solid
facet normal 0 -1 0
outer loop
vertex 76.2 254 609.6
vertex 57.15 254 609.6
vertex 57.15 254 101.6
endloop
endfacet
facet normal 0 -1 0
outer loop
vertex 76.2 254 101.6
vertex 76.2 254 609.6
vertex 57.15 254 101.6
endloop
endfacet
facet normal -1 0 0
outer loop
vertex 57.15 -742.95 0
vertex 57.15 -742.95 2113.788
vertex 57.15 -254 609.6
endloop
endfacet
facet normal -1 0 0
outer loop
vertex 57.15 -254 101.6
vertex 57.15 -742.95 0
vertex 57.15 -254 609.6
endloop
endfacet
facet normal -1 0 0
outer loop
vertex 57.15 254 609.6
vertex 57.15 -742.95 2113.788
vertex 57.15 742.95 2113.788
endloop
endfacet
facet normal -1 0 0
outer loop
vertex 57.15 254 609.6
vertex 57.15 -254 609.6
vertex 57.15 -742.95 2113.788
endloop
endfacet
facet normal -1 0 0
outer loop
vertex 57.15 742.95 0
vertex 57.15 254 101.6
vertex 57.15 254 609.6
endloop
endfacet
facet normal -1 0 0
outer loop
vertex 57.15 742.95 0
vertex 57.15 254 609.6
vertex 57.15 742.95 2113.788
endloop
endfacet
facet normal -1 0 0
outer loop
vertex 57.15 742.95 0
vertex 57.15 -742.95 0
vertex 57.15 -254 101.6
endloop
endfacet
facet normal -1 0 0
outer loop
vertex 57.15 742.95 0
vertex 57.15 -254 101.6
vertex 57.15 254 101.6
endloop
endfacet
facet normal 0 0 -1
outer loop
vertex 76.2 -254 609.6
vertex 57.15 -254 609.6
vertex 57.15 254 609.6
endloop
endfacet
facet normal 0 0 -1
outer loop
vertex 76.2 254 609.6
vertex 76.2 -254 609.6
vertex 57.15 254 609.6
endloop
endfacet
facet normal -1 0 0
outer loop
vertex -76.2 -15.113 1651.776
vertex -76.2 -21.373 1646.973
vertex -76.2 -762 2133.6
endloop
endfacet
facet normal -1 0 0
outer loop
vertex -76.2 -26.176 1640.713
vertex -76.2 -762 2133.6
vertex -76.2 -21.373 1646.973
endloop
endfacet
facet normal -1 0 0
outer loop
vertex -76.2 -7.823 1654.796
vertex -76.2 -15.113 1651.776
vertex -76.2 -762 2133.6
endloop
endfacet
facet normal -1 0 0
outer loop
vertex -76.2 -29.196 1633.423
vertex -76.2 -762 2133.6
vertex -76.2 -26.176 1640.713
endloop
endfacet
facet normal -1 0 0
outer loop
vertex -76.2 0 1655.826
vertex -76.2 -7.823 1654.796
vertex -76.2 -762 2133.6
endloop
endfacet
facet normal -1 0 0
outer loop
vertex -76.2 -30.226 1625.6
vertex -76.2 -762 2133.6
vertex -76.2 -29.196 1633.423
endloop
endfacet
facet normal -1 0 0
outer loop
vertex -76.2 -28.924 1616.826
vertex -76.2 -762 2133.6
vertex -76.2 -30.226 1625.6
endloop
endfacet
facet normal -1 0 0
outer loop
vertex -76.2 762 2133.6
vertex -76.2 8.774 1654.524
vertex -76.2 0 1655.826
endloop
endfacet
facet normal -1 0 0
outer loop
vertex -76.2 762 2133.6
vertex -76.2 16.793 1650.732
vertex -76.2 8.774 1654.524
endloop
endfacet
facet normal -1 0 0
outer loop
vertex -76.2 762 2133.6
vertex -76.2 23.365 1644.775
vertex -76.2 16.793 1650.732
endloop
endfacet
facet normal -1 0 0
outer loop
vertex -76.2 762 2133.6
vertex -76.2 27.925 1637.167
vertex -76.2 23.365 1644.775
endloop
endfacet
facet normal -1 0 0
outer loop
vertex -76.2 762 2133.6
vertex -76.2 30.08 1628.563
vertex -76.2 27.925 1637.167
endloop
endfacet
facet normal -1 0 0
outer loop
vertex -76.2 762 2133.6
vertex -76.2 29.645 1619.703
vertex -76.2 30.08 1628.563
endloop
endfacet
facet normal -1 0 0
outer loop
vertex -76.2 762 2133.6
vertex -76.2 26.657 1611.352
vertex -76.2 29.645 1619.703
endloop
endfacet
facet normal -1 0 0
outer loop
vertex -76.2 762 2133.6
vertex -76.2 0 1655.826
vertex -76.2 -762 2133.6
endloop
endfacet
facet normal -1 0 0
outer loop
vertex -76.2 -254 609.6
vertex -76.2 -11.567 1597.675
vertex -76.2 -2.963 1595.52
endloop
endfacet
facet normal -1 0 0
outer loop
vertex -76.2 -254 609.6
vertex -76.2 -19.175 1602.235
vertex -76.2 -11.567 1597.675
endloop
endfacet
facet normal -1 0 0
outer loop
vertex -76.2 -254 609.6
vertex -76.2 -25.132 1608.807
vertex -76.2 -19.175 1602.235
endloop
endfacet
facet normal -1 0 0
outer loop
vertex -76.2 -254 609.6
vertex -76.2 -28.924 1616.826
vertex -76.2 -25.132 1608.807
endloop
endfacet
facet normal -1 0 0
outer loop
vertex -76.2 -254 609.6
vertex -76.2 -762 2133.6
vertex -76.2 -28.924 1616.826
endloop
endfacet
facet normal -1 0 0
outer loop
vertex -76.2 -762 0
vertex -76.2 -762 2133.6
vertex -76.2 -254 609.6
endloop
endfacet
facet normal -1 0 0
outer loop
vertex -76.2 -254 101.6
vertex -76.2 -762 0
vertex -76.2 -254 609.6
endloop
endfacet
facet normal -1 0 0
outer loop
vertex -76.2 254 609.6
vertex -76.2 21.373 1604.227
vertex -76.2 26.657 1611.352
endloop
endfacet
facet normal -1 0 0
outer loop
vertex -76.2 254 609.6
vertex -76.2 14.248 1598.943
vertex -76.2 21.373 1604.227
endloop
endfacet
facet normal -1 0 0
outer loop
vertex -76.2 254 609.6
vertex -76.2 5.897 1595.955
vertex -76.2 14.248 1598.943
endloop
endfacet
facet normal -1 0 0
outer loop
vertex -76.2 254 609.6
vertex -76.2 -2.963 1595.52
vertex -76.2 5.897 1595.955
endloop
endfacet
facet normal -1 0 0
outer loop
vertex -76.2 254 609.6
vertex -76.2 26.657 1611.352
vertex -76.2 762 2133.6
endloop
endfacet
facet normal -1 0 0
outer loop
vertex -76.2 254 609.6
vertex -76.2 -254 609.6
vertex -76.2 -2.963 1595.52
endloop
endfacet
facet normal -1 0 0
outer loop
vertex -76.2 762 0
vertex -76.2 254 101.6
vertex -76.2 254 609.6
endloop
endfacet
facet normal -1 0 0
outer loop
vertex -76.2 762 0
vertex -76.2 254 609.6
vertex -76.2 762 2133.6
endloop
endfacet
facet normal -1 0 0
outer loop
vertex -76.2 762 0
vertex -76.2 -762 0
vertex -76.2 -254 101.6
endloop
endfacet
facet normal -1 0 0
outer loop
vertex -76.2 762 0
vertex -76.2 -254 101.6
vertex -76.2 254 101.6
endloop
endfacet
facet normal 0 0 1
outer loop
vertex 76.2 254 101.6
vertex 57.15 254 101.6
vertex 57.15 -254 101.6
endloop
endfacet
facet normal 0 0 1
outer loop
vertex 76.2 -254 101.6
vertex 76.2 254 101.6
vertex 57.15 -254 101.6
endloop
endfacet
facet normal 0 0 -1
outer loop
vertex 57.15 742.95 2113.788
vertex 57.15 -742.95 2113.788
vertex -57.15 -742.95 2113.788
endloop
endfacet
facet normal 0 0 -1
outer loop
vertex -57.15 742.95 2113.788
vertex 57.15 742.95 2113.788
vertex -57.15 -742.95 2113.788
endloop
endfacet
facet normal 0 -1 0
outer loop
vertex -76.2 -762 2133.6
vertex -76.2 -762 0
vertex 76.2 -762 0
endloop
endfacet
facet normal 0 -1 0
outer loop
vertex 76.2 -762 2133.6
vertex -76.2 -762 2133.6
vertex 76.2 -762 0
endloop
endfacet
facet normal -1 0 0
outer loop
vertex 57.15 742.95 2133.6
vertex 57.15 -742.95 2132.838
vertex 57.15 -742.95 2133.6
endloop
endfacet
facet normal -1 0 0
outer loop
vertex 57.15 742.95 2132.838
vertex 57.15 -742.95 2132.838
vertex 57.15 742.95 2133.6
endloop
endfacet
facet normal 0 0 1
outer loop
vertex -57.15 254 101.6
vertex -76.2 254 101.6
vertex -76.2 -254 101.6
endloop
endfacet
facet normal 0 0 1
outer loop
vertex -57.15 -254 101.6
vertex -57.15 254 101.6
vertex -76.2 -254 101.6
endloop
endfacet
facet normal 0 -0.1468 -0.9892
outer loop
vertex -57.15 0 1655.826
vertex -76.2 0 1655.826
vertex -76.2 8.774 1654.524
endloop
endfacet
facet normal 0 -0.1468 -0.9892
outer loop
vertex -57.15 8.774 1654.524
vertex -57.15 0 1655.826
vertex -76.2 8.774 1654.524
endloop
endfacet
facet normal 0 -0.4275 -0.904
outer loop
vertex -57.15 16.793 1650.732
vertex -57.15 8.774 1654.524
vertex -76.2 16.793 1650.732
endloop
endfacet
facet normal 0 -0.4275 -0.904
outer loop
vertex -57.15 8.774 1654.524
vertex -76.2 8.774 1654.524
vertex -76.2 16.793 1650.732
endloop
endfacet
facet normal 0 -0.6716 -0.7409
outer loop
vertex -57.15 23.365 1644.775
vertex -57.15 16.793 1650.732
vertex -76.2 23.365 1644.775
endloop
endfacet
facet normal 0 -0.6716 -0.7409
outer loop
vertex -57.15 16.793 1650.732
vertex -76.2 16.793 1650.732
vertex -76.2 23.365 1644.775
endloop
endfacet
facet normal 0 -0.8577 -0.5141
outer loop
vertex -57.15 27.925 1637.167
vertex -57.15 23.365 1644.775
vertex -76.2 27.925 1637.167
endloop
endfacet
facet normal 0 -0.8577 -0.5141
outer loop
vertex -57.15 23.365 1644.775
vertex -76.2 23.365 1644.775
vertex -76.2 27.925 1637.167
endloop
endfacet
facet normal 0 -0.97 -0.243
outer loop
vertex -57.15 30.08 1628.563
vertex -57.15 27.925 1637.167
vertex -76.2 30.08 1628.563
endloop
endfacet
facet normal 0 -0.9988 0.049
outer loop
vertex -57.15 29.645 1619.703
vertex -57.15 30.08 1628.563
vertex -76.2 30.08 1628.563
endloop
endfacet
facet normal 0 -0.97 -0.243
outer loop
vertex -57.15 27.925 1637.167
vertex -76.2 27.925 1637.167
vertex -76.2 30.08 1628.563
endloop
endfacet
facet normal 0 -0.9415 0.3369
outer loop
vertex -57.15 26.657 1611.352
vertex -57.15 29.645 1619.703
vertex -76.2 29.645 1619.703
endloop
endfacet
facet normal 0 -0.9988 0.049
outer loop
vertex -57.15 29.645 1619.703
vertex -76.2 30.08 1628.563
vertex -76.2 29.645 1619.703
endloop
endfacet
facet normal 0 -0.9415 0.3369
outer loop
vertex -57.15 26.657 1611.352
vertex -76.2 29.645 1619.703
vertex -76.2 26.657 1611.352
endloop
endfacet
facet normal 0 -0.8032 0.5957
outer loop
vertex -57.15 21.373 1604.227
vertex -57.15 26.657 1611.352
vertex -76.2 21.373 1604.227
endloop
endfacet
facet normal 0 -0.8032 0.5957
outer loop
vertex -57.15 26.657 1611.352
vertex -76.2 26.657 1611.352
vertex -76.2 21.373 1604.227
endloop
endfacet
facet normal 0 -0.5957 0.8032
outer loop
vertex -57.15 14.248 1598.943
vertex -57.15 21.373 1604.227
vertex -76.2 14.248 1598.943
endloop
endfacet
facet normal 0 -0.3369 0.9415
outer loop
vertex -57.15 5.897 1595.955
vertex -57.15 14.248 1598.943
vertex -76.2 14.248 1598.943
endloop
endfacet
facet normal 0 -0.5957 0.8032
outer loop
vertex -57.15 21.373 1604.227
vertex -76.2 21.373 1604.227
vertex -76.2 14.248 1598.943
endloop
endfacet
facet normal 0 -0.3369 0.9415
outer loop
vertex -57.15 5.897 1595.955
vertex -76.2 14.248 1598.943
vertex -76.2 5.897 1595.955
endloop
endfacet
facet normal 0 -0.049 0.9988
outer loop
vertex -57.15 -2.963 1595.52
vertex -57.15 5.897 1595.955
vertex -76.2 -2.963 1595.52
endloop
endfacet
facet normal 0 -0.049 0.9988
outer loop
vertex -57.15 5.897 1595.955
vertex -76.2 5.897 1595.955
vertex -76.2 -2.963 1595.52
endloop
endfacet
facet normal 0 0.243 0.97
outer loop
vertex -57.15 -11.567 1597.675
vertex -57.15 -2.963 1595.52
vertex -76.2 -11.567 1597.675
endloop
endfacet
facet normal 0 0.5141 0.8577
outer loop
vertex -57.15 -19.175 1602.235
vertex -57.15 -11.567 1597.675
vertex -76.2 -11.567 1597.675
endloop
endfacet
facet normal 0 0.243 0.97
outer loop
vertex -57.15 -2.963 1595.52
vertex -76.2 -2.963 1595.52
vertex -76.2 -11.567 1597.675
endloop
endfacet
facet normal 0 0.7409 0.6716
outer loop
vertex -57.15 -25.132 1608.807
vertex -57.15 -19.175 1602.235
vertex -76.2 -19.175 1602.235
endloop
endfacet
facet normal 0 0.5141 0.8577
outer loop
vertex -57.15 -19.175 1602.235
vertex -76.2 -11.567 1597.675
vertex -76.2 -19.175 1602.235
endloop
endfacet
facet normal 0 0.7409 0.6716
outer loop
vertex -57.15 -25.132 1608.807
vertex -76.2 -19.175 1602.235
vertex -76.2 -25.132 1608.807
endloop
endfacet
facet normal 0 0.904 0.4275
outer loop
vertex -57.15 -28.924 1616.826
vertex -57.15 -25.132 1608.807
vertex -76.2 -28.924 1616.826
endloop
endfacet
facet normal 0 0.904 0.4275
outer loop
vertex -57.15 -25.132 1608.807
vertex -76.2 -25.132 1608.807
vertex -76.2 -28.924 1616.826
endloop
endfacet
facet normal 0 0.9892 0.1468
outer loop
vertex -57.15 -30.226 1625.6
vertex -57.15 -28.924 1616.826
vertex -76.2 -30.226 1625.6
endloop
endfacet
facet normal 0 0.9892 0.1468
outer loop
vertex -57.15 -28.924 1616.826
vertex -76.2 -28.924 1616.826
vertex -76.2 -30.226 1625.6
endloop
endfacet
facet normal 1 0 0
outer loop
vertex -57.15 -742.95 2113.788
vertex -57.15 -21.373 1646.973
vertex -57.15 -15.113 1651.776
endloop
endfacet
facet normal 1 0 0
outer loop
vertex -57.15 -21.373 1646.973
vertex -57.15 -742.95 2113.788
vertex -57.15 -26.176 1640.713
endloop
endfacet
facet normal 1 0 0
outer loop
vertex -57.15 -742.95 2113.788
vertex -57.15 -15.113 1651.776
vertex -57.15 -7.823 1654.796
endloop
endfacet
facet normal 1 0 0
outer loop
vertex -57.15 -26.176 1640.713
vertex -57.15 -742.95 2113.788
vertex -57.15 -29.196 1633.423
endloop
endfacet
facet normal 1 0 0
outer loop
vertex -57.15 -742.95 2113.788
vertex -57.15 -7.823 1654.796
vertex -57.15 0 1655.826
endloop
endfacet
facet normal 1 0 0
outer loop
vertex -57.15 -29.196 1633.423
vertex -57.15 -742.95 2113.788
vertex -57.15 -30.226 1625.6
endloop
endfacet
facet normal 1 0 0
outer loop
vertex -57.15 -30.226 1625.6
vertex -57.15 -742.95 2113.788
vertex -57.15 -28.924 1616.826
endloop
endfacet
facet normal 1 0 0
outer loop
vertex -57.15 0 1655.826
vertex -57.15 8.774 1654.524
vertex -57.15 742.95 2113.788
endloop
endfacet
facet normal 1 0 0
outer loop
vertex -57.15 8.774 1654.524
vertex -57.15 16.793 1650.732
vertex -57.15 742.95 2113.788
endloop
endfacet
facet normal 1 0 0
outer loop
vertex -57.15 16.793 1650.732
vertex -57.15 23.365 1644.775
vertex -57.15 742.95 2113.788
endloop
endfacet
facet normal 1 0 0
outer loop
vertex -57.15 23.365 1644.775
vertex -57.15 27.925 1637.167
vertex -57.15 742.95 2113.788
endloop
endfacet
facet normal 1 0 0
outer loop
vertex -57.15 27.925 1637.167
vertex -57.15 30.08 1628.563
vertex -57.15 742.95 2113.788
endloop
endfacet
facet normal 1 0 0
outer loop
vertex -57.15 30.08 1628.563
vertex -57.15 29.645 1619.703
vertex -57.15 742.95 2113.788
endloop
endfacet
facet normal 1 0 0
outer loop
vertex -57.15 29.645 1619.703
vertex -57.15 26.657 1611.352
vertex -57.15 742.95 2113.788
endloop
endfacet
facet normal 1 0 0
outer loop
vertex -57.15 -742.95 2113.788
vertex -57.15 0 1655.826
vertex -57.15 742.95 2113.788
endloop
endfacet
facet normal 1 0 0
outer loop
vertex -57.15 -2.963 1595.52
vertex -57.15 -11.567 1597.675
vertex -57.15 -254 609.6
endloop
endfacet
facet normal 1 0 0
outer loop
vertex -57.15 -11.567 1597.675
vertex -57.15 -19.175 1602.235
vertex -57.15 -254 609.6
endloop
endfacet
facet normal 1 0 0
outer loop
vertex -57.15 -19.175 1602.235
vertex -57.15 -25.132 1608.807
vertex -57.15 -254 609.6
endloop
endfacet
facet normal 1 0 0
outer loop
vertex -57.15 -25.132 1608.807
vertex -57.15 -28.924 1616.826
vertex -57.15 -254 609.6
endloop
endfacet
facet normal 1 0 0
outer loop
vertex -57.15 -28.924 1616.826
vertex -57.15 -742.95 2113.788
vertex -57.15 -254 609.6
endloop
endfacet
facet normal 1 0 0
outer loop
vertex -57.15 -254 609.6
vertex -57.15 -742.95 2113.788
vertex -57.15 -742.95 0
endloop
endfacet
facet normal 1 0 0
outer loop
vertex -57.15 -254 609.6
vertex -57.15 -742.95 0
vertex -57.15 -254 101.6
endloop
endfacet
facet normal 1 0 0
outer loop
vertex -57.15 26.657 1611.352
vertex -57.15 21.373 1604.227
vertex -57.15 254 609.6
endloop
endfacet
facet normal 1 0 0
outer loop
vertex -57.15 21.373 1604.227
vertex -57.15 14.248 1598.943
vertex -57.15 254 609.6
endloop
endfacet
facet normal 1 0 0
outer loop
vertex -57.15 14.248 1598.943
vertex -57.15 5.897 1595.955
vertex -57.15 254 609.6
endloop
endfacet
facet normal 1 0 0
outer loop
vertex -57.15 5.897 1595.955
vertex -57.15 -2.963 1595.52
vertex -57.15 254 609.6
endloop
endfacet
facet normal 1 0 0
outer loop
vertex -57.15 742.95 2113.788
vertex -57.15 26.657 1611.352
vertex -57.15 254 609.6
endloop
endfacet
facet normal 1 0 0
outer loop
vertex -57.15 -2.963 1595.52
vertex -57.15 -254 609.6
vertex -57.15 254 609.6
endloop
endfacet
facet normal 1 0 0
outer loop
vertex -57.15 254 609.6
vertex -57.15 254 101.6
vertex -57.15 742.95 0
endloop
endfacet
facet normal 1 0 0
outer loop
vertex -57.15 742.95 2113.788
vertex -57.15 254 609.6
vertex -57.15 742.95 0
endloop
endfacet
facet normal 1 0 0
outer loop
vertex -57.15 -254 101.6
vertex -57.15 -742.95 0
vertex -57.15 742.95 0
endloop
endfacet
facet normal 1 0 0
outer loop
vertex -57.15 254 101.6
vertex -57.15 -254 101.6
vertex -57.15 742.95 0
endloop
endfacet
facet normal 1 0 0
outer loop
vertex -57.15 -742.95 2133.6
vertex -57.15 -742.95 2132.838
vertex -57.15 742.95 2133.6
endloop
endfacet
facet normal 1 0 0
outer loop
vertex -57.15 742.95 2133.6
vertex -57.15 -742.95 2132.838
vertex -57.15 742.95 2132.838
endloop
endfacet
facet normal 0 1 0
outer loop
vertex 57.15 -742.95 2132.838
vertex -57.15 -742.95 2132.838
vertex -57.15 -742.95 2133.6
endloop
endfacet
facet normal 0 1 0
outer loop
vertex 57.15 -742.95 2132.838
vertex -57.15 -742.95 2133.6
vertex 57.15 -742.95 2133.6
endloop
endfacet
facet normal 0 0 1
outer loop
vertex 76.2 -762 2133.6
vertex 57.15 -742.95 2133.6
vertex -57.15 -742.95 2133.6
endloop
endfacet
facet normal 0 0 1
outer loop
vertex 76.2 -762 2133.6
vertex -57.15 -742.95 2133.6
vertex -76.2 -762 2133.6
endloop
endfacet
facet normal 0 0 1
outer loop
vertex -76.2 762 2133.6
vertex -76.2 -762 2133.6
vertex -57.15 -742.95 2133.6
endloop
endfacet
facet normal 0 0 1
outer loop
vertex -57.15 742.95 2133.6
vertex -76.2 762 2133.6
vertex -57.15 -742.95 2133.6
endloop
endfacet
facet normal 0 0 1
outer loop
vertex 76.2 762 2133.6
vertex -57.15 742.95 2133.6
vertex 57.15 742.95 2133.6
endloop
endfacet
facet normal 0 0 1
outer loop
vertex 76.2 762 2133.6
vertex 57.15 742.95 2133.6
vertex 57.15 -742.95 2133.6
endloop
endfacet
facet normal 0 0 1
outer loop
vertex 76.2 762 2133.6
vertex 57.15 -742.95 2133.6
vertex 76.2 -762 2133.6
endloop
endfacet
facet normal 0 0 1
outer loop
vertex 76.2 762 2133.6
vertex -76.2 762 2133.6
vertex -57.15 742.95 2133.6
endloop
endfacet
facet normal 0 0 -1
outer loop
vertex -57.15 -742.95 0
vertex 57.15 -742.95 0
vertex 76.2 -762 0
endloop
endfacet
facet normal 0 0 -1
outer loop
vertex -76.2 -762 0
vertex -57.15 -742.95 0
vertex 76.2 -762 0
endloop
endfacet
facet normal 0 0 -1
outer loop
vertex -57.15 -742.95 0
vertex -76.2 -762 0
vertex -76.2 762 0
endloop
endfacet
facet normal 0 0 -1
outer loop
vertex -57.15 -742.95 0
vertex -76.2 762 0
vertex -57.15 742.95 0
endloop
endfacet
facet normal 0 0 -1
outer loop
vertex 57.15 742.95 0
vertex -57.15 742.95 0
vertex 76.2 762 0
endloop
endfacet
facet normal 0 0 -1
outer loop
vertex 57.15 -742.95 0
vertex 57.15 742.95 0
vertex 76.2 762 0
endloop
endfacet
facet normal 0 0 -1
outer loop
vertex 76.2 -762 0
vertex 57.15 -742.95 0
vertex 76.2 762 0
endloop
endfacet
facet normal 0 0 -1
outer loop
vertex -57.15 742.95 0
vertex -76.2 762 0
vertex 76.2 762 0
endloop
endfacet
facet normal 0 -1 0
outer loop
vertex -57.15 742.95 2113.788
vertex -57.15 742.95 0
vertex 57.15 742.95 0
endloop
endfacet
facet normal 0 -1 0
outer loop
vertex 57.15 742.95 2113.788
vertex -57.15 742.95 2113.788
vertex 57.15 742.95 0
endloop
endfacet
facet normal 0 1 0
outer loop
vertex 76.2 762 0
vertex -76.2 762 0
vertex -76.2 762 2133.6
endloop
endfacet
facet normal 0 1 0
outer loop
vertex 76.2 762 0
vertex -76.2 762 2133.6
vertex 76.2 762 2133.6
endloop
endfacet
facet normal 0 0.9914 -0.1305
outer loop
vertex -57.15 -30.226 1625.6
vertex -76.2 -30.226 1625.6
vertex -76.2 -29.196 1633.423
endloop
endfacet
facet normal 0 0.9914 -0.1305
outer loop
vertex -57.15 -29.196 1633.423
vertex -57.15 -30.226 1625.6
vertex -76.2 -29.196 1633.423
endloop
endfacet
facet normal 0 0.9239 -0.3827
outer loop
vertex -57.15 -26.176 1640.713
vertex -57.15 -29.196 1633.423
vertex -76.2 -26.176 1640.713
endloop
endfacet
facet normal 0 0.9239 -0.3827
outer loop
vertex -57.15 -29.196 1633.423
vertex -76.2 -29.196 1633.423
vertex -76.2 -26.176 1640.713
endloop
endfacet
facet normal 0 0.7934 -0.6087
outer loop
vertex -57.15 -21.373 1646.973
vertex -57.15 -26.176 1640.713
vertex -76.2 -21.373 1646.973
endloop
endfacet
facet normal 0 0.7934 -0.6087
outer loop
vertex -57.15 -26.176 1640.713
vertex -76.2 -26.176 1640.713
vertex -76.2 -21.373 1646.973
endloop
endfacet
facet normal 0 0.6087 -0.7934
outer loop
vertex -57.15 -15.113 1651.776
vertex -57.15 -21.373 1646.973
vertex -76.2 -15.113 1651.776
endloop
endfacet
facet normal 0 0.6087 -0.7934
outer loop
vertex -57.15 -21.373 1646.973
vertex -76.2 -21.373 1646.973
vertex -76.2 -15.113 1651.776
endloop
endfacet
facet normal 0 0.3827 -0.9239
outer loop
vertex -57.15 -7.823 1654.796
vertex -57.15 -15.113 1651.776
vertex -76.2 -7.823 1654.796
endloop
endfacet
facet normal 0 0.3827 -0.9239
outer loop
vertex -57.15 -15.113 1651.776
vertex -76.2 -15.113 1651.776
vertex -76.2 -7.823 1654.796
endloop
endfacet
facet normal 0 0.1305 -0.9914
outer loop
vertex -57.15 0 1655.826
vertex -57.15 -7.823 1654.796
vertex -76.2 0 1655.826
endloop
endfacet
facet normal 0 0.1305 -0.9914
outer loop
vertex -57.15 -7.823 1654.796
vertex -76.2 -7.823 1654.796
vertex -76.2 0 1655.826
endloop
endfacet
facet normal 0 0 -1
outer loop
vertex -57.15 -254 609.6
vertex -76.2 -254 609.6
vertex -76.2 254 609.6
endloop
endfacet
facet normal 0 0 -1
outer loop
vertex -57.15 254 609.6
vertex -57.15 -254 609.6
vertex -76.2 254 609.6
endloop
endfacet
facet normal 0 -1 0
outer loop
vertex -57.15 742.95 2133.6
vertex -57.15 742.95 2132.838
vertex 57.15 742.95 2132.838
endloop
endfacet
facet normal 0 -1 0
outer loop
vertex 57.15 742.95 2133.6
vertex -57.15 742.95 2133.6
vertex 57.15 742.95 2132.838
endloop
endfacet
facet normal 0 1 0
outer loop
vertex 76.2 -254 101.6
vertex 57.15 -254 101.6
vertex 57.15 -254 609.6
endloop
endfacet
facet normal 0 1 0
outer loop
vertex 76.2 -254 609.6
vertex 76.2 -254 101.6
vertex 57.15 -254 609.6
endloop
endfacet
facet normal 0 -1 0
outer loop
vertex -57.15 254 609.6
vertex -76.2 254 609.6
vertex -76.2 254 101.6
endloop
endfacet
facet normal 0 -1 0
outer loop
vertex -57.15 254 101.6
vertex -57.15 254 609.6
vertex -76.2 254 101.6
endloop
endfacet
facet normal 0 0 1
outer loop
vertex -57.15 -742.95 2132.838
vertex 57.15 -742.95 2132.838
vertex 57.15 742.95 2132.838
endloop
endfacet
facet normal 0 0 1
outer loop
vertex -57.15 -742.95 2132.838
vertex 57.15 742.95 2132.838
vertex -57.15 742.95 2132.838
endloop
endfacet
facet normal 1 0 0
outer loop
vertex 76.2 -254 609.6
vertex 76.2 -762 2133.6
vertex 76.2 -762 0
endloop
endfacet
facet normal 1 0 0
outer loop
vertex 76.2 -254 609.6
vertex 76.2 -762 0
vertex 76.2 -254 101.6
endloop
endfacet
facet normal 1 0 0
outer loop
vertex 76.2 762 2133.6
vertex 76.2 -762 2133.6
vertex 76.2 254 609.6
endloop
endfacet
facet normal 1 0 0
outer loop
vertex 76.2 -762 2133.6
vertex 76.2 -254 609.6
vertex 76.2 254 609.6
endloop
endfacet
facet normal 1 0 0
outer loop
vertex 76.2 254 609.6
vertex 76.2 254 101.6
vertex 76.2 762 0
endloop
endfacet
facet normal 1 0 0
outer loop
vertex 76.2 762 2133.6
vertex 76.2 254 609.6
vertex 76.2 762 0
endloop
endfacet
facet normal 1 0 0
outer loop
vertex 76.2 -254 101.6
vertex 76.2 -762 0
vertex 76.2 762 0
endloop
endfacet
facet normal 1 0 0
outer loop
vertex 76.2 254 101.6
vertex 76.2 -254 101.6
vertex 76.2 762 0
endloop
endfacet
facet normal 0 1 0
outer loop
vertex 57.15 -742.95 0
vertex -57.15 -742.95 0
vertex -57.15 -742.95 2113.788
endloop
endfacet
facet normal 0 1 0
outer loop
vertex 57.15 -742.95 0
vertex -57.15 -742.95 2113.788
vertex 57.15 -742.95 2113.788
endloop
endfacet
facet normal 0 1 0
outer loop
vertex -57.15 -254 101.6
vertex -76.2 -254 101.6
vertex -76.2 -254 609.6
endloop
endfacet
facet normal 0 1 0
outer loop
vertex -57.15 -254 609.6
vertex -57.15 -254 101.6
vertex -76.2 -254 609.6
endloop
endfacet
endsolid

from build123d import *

# Parameters (mm, degrees)
F0_W     = 152.4
F0_H     = 1524
F0_W_2   = 114.3
F0_H_2   = 1485.9
F1_DEPTH = 2133.6
F2_W     = 114.3
F2_H     = 19.05
F3_DEPTH = 1485.9
F5_DEPTH = 25.4
F7_DEPTH = 177.8


with BuildPart() as f1:
    # F0 (on Top) → F1 (new body)
    with BuildSketch(Plane.XY):
        Rectangle(F0_W, F0_H)
        Rectangle(F0_W_2, F0_H_2, mode=Mode.SUBTRACT)
    extrude(amount=F1_DEPTH)

    # F2 (on face) → F3 (join)
    with BuildSketch(Plane(origin=(0, -742.95, 0), x_dir=(-1, 0, 0), z_dir=(0, 1, 0))):
        with Locations((0, 2123.313)):
            Rectangle(F2_W, F2_H)
    extrude(amount=F3_DEPTH)

    # F4 (on face) → F5 (cut)
    with BuildSketch(Plane(origin=(-76.2, 0, 0), x_dir=(0, -1, 0), z_dir=(-1, 0, 0))):
        with BuildLine():
            ThreePointArc((30.226, 1625.6), (21.37301, 1646.97301), (0, 1655.826))
            ThreePointArc((0, 1655.826), (-21.37301, 1604.22699), (30.226, 1625.6))
        make_face()
    extrude(amount=-F5_DEPTH, mode=Mode.SUBTRACT)

    # F6 (on face) → F7 (cut)
    with BuildSketch(Plane(origin=(-76.2, 0, 0), x_dir=(0, -1, 0), z_dir=(-1, 0, 0))):
        Polygon((-254, 101.6), (0, 101.6), (254, 101.6), (254, 609.6), (-254, 609.6), align=None)
    extrude(amount=-F7_DEPTH, mode=Mode.SUBTRACT)


solid = f1.part
